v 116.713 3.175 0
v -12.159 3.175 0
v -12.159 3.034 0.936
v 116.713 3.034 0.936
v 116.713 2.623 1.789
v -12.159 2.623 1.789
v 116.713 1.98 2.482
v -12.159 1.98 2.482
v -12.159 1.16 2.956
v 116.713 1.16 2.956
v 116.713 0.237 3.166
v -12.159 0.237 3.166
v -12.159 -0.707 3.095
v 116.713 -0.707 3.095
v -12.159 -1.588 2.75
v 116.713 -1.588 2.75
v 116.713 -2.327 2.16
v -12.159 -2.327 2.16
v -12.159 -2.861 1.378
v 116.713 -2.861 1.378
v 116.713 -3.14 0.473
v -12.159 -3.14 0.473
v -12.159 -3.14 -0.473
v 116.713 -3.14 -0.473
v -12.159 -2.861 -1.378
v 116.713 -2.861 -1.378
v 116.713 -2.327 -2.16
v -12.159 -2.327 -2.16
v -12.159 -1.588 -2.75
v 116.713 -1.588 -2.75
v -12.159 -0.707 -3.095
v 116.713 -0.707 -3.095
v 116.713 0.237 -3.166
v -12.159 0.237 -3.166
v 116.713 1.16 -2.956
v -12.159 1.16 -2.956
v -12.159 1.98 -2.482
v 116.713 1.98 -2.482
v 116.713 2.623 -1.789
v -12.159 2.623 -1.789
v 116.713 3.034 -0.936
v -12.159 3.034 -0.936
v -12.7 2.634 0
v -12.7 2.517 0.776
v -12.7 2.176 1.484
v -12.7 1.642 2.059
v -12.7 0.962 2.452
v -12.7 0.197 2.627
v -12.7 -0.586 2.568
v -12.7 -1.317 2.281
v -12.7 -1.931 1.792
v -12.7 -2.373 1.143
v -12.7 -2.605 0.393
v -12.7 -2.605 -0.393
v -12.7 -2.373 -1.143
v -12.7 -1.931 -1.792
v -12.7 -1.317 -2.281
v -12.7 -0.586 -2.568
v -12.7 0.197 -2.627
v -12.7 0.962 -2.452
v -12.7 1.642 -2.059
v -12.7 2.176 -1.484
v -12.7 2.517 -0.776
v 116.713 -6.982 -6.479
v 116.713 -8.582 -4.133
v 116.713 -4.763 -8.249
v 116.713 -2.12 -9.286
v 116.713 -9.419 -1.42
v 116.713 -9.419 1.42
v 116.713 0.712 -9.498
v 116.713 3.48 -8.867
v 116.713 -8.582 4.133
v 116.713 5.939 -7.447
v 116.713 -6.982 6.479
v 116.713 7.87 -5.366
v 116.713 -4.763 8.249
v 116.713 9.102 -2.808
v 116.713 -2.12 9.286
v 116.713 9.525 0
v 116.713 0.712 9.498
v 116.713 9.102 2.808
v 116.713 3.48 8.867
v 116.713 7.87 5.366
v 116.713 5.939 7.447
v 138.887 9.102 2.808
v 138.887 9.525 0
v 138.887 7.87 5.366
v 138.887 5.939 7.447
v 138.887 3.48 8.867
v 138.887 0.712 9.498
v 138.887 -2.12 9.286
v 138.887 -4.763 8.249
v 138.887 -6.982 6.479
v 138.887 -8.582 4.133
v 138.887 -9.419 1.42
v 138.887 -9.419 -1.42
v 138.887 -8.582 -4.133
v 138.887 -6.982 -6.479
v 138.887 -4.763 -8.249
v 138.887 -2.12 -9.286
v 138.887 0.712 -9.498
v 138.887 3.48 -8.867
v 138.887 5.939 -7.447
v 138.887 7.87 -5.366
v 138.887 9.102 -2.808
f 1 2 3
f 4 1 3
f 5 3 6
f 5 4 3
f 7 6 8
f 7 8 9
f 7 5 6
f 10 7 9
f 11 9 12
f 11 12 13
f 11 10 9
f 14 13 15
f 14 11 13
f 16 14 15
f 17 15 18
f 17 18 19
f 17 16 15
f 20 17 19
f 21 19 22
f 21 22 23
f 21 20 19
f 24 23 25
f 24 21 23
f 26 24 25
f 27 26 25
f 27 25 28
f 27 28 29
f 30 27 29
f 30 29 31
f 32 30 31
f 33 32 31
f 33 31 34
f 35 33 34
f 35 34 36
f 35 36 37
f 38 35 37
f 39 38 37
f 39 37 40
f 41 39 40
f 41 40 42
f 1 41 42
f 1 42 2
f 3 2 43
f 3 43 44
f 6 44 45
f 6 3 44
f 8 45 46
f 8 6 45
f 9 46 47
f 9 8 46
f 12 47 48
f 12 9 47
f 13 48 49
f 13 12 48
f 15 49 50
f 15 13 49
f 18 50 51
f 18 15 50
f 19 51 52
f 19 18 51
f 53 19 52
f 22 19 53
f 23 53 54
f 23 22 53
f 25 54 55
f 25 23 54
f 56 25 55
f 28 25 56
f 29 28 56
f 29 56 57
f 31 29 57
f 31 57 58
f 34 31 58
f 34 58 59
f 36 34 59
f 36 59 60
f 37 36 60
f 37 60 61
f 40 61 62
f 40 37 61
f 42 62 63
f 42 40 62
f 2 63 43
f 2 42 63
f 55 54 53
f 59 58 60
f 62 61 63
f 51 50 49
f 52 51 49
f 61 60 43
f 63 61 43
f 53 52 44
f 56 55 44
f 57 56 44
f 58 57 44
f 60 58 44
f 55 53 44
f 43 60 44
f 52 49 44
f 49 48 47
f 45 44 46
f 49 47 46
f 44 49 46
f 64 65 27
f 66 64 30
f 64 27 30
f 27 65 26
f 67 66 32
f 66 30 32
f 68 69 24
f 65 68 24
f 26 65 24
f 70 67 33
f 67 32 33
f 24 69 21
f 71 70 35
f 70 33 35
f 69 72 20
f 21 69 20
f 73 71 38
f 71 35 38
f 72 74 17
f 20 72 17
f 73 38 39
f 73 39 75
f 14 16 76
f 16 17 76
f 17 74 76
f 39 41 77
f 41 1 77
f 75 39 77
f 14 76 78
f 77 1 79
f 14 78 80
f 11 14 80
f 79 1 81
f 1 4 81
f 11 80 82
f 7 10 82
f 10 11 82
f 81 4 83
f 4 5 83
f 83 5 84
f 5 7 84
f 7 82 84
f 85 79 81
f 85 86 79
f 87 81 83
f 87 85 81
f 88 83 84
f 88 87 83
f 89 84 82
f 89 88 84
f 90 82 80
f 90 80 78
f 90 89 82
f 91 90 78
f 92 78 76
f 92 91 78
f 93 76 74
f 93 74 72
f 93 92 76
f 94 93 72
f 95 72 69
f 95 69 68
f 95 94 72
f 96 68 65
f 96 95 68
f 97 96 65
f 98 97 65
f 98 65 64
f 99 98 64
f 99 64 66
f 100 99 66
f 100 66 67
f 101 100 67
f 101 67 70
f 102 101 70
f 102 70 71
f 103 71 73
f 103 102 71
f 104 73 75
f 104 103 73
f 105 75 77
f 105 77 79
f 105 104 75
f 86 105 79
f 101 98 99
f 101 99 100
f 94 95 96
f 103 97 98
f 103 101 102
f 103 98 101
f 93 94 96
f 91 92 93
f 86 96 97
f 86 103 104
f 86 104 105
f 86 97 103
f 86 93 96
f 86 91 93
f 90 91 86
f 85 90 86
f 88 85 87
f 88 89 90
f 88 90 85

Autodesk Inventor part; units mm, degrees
sketch "Sketch_1" plane through (0, 0, 0) normal (0, 0, 1) x (1, 0, 0)
  line L0 (138.8872, 0) -> (0, 0)
  line L1 (0, 0) -> (0, 3.175)
  line L2 (0, 3.175) -> (138.8872, 3.175)
  line L3 (138.8872, 3.175) -> (138.8872, 0)
  line L4 (138.8872, 0) -> (0, 0)
revolve "Revolution1" add sketch "Sketch_1" angle 360 about axis through (138.8872, 0, 0) along (1, 0, 0)
sketch "Sketch_3" plane through (0, 0, 0) normal (0, 0, 1) x (1, 0, 0)
  line L0 (138.8872, 0) -> (116.713, 0)
  line L1 (116.713, 0) -> (116.713, 9.525)
  line L2 (116.713, 9.525) -> (138.8872, 9.525)
  line L3 (138.8872, 9.525) -> (138.8872, 0)
  line L4 (138.8872, 0) -> (116.713, 0)
revolve "Revolution2" add sketch "Sketch_3" angle 360 about axis through (138.8872, 0, 0) along (1, 0, 0)
sketch "Sketch_4" plane through (0, 0, 0) normal (0, 0, 1) x (1, 0, 0)
  line L0 (0, 0) -> (-12.7, 0)
  line L1 (-12.7, 0) -> (-12.7, 2.634)
  line L2 (-12.7, 2.634) -> (-12.159, 3.175)
  line L3 (-12.159, 3.175) -> (0, 3.175)
  line L4 (0, 3.175) -> (0, 0)
  line L5 (0, 0) -> (-12.7, 0)
revolve "Revolution3" add sketch "Sketch_4" angle 360 about axis through (0, 0, 0) along (1, 0, 0)
ref_plane "a_XY" through (-12.7, 0, 0) normal (1, 0, 0) x (0, 0, -1)
ref_plane "a_YZ" through (-12.7, 0, 0) normal (0, 0, -1) x (0, 1, 0)
ref_plane "a_ZX" through (-12.7, 0, 0) normal (0, 1, 0) x (1, 0, 0)
ref_plane "c1_XY" through (0, 0, 0) normal (1, 0, 0) x (0, 0, -1)
ref_plane "c1_YZ" through (0, 0, 0) normal (0, 0, -1) x (0, 1, 0)
ref_plane "c1_ZX" through (0, 0, 0) normal (0, 1, 0) x (1, 0, 0)
ref_plane "cc1_XY" through (0, 0, -3.175) normal (1, 0, 0) x (0, 0, -1)
ref_plane "cc1_YZ" through (0, 0, -3.175) normal (0, 0, -1) x (0, 1, 0)
ref_plane "cc1_ZX" through (0, 0, -3.175) normal (0, 1, 0) x (1, 0, 0)
ref_plane "cc2_XY" through (0, 0, 3.175) normal (1, 0, 0) x (0, 0, -1)
ref_plane "cc2_YZ" through (0, 0, 3.175) normal (0, 0, -1) x (0, 1, 0)
ref_plane "cc2_ZX" through (0, 0, 3.175) normal (0, 1, 0) x (1, 0, 0)
ref_plane "kk_XY" through (-6.35, 0, 3.175) normal (1, 0, 0) x (0, 0, -1)
ref_plane "kk_YZ" through (-6.35, 0, 3.175) normal (0, 0, -1) x (0, 1, 0)
ref_plane "kk_ZX" through (-6.35, 0, 3.175) normal (0, 1, 0) x (1, 0, 0)
ref_plane "rod_XY" through (138.8872, 0, 0) normal (1, 0, 0) x (0, 0, -1)
ref_plane "rod_YZ" through (138.8872, 0, 0) normal (0, 0, -1) x (0, 1, 0)
ref_plane "rod_ZX" through (138.8872, 0, 0) normal (0, 1, 0) x (1, 0, 0)
properties part number "5.4680.8730.50.500Double acting_00_005.4680.500.75N"
